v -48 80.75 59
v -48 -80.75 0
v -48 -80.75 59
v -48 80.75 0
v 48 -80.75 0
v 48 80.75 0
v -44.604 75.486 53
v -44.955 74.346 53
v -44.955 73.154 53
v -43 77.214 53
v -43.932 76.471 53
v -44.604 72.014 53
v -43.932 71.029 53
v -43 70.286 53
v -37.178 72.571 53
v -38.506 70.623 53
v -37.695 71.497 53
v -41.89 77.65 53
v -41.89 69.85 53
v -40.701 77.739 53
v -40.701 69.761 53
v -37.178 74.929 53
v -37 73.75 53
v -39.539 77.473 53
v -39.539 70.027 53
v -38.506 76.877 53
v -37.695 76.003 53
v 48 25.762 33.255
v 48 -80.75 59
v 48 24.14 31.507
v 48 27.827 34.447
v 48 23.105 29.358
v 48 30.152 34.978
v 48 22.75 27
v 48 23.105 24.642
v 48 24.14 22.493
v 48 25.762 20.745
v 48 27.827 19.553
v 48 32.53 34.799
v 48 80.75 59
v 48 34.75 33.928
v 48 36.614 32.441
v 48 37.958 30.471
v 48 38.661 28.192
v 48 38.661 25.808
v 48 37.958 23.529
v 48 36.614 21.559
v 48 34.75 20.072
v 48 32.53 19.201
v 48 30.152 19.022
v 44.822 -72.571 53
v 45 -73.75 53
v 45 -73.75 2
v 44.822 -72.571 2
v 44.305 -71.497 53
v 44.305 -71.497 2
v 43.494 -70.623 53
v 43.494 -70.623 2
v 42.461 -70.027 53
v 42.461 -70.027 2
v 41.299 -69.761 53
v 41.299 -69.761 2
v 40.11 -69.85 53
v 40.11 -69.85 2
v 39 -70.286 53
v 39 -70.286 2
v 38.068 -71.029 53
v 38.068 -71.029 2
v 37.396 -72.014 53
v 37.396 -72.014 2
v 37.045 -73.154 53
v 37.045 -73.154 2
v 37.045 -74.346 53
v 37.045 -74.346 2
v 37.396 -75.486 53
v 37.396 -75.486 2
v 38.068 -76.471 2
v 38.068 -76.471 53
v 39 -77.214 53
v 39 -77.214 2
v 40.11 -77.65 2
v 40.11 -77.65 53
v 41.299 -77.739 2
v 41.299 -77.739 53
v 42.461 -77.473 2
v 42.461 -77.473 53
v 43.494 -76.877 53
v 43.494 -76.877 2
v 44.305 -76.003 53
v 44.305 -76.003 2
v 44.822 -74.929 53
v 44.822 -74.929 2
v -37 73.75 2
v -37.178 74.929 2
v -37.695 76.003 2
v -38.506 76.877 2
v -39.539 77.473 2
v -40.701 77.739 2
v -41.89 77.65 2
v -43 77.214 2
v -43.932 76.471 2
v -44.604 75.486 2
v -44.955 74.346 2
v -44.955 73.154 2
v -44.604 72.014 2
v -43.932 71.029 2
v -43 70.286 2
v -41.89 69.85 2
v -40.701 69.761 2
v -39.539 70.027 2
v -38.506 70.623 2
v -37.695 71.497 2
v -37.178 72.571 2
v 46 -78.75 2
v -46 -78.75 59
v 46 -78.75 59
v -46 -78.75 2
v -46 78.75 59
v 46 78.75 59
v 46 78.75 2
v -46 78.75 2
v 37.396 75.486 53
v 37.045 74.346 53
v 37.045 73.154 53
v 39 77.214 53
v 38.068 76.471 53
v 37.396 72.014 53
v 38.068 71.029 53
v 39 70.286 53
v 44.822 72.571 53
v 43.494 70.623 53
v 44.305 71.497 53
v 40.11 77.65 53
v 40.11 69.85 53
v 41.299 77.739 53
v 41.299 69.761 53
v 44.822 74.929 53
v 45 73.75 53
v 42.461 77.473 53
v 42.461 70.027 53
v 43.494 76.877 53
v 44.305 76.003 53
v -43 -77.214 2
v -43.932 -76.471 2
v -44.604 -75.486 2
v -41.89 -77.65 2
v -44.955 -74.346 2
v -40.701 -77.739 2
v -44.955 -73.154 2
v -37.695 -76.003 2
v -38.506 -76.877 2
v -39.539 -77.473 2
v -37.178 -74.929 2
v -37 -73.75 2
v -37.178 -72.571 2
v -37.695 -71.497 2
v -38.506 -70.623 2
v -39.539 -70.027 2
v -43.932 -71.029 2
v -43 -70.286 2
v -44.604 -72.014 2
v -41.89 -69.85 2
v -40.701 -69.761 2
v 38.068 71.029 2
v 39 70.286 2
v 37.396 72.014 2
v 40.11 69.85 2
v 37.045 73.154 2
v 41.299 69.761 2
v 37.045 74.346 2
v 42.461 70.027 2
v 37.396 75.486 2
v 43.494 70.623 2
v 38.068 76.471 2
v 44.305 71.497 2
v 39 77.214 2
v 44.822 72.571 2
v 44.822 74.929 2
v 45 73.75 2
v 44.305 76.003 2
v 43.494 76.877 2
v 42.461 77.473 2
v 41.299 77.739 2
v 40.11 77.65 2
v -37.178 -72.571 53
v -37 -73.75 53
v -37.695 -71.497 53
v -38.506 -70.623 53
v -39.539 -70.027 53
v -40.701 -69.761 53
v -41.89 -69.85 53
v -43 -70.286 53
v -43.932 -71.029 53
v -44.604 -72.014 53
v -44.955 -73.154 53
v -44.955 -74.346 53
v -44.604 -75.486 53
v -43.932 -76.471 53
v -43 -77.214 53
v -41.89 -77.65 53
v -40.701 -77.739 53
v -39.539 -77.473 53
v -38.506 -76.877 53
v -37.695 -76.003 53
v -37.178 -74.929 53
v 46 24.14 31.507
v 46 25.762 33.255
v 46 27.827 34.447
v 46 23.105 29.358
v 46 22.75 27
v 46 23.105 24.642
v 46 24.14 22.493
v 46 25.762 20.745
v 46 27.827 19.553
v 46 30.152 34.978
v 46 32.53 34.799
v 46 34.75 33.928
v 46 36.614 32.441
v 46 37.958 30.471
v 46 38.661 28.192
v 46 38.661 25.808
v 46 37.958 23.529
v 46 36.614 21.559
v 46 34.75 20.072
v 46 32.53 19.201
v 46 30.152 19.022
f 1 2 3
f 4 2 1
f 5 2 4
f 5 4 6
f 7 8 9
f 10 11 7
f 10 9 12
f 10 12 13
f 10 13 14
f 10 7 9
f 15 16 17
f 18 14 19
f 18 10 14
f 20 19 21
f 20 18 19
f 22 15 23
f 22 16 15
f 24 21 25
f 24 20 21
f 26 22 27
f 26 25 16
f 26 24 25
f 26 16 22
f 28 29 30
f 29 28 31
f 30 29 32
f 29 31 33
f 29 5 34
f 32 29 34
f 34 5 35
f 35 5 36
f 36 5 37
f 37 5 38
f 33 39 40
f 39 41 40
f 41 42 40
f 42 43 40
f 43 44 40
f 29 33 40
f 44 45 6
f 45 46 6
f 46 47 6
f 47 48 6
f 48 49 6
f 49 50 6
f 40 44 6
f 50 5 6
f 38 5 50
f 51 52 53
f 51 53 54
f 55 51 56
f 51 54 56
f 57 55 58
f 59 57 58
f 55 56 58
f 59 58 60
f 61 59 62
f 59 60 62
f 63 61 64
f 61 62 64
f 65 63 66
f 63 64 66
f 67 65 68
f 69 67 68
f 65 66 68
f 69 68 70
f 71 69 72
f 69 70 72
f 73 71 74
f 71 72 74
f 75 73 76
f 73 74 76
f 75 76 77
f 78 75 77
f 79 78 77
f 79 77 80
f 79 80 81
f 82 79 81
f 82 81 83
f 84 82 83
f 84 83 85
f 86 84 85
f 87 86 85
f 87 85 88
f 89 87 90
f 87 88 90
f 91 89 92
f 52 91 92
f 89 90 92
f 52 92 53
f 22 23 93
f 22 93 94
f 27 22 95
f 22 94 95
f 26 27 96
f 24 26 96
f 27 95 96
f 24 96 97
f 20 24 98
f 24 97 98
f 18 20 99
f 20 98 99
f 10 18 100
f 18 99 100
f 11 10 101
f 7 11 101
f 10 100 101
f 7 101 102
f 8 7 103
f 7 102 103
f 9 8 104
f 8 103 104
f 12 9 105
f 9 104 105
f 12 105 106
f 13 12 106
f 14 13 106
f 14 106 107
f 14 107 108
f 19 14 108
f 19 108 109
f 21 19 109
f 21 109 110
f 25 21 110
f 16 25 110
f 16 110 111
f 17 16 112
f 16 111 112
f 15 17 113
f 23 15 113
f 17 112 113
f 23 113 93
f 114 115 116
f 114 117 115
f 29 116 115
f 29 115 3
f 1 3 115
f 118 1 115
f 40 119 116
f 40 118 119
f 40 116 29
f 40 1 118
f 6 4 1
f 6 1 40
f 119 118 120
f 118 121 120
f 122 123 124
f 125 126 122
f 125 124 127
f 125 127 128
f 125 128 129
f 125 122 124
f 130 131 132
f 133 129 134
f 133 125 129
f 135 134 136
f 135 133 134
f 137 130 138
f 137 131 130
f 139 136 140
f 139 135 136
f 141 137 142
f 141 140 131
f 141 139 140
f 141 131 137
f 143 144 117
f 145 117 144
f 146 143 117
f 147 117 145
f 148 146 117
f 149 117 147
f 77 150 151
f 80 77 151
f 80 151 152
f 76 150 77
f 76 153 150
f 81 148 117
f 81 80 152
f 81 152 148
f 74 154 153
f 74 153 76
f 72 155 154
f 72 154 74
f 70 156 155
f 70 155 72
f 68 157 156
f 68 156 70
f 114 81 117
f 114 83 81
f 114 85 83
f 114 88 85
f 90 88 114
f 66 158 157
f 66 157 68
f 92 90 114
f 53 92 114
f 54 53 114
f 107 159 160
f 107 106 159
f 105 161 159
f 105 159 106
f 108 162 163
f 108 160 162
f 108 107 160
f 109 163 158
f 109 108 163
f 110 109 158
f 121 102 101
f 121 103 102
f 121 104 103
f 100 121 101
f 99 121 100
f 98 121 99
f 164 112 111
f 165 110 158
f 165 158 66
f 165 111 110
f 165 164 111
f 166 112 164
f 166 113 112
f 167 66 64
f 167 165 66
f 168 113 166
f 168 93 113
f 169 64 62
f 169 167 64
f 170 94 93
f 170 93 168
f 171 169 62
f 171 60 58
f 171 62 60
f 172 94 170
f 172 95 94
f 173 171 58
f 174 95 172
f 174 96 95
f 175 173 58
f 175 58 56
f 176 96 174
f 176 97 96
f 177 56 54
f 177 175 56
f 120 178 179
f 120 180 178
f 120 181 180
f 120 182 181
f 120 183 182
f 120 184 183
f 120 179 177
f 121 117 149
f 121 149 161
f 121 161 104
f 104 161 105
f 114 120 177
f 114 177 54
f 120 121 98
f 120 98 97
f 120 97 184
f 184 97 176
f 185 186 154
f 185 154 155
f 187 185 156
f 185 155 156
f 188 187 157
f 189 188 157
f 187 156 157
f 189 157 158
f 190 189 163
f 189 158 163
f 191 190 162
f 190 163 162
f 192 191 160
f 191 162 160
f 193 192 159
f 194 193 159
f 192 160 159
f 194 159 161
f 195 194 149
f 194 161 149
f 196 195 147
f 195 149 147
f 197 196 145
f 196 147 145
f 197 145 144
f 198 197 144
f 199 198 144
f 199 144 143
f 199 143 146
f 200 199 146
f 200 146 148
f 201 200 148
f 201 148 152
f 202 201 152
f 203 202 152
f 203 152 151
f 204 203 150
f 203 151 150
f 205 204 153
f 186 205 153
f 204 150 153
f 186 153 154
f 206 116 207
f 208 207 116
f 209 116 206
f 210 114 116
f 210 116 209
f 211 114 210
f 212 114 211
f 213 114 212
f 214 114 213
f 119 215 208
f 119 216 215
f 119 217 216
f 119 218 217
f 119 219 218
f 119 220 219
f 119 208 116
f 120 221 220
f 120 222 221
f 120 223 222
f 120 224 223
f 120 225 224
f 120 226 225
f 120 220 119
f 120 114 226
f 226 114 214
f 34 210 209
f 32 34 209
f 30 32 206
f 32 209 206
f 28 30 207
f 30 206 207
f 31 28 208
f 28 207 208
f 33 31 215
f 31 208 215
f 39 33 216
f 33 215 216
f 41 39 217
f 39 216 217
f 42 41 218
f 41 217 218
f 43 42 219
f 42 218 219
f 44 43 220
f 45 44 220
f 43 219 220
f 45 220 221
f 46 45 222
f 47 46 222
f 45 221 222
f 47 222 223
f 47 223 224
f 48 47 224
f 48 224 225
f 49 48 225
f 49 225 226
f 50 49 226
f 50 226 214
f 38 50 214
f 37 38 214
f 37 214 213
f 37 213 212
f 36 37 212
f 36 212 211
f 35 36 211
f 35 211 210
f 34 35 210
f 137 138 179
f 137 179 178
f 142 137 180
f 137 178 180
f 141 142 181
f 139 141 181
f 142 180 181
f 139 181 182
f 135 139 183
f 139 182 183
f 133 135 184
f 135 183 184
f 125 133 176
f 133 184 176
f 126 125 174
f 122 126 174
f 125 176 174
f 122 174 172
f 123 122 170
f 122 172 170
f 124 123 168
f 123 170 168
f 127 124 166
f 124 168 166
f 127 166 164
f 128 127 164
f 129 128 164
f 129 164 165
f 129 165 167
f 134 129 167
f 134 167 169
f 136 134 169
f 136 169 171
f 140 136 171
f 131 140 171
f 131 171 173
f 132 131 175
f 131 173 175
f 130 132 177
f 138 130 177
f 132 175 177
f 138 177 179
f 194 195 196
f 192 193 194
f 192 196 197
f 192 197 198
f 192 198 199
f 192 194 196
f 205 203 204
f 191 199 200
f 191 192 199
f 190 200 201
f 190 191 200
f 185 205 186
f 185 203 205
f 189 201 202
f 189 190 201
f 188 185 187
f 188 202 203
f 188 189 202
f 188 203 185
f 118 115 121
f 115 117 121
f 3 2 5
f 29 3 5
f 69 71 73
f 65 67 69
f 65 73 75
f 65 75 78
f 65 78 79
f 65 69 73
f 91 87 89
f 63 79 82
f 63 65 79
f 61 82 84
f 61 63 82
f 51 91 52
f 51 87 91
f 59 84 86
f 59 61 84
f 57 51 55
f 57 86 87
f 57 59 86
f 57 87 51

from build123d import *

# Parameters (mm, degrees)
F0_W     = 96
F0_H     = 161.5
F1_DEPTH = 59
F2_T     = -2
F3_R     = 4
F4_DEPTH = 51
F6_D     = 16
F6_DEPTH = 3


with BuildPart() as f1:
    # F0 (on Top) → F1 (new body)
    with BuildSketch(Plane.XY):
        Rectangle(F0_W, F0_H)
    extrude(amount=F1_DEPTH)

    # F2
    f2_openings = [f1.faces().sort_by_distance(p)[0] for p in [
        (0, 0, 59),
    ]]
    offset(amount=F2_T, openings=f2_openings)

    # F3 (on face) → F4 (join)
    with BuildSketch(Plane.XY.offset(2)):
        with Locations((-41, 73.75)):
            Circle(F3_R)
        with Locations((41, 73.75)):
            Circle(F3_R)
        with Locations((41, -73.75)):
            Circle(F3_R)
        with Locations((-41, -73.75)):
            Circle(F3_R)
    extrude(amount=F4_DEPTH)

    # F6
    with Locations(Plane.YZ.offset(48)):
        with Locations((30.75, 27)):
            Hole(F6_D / 2, depth=F6_DEPTH)


solid = f1.part
